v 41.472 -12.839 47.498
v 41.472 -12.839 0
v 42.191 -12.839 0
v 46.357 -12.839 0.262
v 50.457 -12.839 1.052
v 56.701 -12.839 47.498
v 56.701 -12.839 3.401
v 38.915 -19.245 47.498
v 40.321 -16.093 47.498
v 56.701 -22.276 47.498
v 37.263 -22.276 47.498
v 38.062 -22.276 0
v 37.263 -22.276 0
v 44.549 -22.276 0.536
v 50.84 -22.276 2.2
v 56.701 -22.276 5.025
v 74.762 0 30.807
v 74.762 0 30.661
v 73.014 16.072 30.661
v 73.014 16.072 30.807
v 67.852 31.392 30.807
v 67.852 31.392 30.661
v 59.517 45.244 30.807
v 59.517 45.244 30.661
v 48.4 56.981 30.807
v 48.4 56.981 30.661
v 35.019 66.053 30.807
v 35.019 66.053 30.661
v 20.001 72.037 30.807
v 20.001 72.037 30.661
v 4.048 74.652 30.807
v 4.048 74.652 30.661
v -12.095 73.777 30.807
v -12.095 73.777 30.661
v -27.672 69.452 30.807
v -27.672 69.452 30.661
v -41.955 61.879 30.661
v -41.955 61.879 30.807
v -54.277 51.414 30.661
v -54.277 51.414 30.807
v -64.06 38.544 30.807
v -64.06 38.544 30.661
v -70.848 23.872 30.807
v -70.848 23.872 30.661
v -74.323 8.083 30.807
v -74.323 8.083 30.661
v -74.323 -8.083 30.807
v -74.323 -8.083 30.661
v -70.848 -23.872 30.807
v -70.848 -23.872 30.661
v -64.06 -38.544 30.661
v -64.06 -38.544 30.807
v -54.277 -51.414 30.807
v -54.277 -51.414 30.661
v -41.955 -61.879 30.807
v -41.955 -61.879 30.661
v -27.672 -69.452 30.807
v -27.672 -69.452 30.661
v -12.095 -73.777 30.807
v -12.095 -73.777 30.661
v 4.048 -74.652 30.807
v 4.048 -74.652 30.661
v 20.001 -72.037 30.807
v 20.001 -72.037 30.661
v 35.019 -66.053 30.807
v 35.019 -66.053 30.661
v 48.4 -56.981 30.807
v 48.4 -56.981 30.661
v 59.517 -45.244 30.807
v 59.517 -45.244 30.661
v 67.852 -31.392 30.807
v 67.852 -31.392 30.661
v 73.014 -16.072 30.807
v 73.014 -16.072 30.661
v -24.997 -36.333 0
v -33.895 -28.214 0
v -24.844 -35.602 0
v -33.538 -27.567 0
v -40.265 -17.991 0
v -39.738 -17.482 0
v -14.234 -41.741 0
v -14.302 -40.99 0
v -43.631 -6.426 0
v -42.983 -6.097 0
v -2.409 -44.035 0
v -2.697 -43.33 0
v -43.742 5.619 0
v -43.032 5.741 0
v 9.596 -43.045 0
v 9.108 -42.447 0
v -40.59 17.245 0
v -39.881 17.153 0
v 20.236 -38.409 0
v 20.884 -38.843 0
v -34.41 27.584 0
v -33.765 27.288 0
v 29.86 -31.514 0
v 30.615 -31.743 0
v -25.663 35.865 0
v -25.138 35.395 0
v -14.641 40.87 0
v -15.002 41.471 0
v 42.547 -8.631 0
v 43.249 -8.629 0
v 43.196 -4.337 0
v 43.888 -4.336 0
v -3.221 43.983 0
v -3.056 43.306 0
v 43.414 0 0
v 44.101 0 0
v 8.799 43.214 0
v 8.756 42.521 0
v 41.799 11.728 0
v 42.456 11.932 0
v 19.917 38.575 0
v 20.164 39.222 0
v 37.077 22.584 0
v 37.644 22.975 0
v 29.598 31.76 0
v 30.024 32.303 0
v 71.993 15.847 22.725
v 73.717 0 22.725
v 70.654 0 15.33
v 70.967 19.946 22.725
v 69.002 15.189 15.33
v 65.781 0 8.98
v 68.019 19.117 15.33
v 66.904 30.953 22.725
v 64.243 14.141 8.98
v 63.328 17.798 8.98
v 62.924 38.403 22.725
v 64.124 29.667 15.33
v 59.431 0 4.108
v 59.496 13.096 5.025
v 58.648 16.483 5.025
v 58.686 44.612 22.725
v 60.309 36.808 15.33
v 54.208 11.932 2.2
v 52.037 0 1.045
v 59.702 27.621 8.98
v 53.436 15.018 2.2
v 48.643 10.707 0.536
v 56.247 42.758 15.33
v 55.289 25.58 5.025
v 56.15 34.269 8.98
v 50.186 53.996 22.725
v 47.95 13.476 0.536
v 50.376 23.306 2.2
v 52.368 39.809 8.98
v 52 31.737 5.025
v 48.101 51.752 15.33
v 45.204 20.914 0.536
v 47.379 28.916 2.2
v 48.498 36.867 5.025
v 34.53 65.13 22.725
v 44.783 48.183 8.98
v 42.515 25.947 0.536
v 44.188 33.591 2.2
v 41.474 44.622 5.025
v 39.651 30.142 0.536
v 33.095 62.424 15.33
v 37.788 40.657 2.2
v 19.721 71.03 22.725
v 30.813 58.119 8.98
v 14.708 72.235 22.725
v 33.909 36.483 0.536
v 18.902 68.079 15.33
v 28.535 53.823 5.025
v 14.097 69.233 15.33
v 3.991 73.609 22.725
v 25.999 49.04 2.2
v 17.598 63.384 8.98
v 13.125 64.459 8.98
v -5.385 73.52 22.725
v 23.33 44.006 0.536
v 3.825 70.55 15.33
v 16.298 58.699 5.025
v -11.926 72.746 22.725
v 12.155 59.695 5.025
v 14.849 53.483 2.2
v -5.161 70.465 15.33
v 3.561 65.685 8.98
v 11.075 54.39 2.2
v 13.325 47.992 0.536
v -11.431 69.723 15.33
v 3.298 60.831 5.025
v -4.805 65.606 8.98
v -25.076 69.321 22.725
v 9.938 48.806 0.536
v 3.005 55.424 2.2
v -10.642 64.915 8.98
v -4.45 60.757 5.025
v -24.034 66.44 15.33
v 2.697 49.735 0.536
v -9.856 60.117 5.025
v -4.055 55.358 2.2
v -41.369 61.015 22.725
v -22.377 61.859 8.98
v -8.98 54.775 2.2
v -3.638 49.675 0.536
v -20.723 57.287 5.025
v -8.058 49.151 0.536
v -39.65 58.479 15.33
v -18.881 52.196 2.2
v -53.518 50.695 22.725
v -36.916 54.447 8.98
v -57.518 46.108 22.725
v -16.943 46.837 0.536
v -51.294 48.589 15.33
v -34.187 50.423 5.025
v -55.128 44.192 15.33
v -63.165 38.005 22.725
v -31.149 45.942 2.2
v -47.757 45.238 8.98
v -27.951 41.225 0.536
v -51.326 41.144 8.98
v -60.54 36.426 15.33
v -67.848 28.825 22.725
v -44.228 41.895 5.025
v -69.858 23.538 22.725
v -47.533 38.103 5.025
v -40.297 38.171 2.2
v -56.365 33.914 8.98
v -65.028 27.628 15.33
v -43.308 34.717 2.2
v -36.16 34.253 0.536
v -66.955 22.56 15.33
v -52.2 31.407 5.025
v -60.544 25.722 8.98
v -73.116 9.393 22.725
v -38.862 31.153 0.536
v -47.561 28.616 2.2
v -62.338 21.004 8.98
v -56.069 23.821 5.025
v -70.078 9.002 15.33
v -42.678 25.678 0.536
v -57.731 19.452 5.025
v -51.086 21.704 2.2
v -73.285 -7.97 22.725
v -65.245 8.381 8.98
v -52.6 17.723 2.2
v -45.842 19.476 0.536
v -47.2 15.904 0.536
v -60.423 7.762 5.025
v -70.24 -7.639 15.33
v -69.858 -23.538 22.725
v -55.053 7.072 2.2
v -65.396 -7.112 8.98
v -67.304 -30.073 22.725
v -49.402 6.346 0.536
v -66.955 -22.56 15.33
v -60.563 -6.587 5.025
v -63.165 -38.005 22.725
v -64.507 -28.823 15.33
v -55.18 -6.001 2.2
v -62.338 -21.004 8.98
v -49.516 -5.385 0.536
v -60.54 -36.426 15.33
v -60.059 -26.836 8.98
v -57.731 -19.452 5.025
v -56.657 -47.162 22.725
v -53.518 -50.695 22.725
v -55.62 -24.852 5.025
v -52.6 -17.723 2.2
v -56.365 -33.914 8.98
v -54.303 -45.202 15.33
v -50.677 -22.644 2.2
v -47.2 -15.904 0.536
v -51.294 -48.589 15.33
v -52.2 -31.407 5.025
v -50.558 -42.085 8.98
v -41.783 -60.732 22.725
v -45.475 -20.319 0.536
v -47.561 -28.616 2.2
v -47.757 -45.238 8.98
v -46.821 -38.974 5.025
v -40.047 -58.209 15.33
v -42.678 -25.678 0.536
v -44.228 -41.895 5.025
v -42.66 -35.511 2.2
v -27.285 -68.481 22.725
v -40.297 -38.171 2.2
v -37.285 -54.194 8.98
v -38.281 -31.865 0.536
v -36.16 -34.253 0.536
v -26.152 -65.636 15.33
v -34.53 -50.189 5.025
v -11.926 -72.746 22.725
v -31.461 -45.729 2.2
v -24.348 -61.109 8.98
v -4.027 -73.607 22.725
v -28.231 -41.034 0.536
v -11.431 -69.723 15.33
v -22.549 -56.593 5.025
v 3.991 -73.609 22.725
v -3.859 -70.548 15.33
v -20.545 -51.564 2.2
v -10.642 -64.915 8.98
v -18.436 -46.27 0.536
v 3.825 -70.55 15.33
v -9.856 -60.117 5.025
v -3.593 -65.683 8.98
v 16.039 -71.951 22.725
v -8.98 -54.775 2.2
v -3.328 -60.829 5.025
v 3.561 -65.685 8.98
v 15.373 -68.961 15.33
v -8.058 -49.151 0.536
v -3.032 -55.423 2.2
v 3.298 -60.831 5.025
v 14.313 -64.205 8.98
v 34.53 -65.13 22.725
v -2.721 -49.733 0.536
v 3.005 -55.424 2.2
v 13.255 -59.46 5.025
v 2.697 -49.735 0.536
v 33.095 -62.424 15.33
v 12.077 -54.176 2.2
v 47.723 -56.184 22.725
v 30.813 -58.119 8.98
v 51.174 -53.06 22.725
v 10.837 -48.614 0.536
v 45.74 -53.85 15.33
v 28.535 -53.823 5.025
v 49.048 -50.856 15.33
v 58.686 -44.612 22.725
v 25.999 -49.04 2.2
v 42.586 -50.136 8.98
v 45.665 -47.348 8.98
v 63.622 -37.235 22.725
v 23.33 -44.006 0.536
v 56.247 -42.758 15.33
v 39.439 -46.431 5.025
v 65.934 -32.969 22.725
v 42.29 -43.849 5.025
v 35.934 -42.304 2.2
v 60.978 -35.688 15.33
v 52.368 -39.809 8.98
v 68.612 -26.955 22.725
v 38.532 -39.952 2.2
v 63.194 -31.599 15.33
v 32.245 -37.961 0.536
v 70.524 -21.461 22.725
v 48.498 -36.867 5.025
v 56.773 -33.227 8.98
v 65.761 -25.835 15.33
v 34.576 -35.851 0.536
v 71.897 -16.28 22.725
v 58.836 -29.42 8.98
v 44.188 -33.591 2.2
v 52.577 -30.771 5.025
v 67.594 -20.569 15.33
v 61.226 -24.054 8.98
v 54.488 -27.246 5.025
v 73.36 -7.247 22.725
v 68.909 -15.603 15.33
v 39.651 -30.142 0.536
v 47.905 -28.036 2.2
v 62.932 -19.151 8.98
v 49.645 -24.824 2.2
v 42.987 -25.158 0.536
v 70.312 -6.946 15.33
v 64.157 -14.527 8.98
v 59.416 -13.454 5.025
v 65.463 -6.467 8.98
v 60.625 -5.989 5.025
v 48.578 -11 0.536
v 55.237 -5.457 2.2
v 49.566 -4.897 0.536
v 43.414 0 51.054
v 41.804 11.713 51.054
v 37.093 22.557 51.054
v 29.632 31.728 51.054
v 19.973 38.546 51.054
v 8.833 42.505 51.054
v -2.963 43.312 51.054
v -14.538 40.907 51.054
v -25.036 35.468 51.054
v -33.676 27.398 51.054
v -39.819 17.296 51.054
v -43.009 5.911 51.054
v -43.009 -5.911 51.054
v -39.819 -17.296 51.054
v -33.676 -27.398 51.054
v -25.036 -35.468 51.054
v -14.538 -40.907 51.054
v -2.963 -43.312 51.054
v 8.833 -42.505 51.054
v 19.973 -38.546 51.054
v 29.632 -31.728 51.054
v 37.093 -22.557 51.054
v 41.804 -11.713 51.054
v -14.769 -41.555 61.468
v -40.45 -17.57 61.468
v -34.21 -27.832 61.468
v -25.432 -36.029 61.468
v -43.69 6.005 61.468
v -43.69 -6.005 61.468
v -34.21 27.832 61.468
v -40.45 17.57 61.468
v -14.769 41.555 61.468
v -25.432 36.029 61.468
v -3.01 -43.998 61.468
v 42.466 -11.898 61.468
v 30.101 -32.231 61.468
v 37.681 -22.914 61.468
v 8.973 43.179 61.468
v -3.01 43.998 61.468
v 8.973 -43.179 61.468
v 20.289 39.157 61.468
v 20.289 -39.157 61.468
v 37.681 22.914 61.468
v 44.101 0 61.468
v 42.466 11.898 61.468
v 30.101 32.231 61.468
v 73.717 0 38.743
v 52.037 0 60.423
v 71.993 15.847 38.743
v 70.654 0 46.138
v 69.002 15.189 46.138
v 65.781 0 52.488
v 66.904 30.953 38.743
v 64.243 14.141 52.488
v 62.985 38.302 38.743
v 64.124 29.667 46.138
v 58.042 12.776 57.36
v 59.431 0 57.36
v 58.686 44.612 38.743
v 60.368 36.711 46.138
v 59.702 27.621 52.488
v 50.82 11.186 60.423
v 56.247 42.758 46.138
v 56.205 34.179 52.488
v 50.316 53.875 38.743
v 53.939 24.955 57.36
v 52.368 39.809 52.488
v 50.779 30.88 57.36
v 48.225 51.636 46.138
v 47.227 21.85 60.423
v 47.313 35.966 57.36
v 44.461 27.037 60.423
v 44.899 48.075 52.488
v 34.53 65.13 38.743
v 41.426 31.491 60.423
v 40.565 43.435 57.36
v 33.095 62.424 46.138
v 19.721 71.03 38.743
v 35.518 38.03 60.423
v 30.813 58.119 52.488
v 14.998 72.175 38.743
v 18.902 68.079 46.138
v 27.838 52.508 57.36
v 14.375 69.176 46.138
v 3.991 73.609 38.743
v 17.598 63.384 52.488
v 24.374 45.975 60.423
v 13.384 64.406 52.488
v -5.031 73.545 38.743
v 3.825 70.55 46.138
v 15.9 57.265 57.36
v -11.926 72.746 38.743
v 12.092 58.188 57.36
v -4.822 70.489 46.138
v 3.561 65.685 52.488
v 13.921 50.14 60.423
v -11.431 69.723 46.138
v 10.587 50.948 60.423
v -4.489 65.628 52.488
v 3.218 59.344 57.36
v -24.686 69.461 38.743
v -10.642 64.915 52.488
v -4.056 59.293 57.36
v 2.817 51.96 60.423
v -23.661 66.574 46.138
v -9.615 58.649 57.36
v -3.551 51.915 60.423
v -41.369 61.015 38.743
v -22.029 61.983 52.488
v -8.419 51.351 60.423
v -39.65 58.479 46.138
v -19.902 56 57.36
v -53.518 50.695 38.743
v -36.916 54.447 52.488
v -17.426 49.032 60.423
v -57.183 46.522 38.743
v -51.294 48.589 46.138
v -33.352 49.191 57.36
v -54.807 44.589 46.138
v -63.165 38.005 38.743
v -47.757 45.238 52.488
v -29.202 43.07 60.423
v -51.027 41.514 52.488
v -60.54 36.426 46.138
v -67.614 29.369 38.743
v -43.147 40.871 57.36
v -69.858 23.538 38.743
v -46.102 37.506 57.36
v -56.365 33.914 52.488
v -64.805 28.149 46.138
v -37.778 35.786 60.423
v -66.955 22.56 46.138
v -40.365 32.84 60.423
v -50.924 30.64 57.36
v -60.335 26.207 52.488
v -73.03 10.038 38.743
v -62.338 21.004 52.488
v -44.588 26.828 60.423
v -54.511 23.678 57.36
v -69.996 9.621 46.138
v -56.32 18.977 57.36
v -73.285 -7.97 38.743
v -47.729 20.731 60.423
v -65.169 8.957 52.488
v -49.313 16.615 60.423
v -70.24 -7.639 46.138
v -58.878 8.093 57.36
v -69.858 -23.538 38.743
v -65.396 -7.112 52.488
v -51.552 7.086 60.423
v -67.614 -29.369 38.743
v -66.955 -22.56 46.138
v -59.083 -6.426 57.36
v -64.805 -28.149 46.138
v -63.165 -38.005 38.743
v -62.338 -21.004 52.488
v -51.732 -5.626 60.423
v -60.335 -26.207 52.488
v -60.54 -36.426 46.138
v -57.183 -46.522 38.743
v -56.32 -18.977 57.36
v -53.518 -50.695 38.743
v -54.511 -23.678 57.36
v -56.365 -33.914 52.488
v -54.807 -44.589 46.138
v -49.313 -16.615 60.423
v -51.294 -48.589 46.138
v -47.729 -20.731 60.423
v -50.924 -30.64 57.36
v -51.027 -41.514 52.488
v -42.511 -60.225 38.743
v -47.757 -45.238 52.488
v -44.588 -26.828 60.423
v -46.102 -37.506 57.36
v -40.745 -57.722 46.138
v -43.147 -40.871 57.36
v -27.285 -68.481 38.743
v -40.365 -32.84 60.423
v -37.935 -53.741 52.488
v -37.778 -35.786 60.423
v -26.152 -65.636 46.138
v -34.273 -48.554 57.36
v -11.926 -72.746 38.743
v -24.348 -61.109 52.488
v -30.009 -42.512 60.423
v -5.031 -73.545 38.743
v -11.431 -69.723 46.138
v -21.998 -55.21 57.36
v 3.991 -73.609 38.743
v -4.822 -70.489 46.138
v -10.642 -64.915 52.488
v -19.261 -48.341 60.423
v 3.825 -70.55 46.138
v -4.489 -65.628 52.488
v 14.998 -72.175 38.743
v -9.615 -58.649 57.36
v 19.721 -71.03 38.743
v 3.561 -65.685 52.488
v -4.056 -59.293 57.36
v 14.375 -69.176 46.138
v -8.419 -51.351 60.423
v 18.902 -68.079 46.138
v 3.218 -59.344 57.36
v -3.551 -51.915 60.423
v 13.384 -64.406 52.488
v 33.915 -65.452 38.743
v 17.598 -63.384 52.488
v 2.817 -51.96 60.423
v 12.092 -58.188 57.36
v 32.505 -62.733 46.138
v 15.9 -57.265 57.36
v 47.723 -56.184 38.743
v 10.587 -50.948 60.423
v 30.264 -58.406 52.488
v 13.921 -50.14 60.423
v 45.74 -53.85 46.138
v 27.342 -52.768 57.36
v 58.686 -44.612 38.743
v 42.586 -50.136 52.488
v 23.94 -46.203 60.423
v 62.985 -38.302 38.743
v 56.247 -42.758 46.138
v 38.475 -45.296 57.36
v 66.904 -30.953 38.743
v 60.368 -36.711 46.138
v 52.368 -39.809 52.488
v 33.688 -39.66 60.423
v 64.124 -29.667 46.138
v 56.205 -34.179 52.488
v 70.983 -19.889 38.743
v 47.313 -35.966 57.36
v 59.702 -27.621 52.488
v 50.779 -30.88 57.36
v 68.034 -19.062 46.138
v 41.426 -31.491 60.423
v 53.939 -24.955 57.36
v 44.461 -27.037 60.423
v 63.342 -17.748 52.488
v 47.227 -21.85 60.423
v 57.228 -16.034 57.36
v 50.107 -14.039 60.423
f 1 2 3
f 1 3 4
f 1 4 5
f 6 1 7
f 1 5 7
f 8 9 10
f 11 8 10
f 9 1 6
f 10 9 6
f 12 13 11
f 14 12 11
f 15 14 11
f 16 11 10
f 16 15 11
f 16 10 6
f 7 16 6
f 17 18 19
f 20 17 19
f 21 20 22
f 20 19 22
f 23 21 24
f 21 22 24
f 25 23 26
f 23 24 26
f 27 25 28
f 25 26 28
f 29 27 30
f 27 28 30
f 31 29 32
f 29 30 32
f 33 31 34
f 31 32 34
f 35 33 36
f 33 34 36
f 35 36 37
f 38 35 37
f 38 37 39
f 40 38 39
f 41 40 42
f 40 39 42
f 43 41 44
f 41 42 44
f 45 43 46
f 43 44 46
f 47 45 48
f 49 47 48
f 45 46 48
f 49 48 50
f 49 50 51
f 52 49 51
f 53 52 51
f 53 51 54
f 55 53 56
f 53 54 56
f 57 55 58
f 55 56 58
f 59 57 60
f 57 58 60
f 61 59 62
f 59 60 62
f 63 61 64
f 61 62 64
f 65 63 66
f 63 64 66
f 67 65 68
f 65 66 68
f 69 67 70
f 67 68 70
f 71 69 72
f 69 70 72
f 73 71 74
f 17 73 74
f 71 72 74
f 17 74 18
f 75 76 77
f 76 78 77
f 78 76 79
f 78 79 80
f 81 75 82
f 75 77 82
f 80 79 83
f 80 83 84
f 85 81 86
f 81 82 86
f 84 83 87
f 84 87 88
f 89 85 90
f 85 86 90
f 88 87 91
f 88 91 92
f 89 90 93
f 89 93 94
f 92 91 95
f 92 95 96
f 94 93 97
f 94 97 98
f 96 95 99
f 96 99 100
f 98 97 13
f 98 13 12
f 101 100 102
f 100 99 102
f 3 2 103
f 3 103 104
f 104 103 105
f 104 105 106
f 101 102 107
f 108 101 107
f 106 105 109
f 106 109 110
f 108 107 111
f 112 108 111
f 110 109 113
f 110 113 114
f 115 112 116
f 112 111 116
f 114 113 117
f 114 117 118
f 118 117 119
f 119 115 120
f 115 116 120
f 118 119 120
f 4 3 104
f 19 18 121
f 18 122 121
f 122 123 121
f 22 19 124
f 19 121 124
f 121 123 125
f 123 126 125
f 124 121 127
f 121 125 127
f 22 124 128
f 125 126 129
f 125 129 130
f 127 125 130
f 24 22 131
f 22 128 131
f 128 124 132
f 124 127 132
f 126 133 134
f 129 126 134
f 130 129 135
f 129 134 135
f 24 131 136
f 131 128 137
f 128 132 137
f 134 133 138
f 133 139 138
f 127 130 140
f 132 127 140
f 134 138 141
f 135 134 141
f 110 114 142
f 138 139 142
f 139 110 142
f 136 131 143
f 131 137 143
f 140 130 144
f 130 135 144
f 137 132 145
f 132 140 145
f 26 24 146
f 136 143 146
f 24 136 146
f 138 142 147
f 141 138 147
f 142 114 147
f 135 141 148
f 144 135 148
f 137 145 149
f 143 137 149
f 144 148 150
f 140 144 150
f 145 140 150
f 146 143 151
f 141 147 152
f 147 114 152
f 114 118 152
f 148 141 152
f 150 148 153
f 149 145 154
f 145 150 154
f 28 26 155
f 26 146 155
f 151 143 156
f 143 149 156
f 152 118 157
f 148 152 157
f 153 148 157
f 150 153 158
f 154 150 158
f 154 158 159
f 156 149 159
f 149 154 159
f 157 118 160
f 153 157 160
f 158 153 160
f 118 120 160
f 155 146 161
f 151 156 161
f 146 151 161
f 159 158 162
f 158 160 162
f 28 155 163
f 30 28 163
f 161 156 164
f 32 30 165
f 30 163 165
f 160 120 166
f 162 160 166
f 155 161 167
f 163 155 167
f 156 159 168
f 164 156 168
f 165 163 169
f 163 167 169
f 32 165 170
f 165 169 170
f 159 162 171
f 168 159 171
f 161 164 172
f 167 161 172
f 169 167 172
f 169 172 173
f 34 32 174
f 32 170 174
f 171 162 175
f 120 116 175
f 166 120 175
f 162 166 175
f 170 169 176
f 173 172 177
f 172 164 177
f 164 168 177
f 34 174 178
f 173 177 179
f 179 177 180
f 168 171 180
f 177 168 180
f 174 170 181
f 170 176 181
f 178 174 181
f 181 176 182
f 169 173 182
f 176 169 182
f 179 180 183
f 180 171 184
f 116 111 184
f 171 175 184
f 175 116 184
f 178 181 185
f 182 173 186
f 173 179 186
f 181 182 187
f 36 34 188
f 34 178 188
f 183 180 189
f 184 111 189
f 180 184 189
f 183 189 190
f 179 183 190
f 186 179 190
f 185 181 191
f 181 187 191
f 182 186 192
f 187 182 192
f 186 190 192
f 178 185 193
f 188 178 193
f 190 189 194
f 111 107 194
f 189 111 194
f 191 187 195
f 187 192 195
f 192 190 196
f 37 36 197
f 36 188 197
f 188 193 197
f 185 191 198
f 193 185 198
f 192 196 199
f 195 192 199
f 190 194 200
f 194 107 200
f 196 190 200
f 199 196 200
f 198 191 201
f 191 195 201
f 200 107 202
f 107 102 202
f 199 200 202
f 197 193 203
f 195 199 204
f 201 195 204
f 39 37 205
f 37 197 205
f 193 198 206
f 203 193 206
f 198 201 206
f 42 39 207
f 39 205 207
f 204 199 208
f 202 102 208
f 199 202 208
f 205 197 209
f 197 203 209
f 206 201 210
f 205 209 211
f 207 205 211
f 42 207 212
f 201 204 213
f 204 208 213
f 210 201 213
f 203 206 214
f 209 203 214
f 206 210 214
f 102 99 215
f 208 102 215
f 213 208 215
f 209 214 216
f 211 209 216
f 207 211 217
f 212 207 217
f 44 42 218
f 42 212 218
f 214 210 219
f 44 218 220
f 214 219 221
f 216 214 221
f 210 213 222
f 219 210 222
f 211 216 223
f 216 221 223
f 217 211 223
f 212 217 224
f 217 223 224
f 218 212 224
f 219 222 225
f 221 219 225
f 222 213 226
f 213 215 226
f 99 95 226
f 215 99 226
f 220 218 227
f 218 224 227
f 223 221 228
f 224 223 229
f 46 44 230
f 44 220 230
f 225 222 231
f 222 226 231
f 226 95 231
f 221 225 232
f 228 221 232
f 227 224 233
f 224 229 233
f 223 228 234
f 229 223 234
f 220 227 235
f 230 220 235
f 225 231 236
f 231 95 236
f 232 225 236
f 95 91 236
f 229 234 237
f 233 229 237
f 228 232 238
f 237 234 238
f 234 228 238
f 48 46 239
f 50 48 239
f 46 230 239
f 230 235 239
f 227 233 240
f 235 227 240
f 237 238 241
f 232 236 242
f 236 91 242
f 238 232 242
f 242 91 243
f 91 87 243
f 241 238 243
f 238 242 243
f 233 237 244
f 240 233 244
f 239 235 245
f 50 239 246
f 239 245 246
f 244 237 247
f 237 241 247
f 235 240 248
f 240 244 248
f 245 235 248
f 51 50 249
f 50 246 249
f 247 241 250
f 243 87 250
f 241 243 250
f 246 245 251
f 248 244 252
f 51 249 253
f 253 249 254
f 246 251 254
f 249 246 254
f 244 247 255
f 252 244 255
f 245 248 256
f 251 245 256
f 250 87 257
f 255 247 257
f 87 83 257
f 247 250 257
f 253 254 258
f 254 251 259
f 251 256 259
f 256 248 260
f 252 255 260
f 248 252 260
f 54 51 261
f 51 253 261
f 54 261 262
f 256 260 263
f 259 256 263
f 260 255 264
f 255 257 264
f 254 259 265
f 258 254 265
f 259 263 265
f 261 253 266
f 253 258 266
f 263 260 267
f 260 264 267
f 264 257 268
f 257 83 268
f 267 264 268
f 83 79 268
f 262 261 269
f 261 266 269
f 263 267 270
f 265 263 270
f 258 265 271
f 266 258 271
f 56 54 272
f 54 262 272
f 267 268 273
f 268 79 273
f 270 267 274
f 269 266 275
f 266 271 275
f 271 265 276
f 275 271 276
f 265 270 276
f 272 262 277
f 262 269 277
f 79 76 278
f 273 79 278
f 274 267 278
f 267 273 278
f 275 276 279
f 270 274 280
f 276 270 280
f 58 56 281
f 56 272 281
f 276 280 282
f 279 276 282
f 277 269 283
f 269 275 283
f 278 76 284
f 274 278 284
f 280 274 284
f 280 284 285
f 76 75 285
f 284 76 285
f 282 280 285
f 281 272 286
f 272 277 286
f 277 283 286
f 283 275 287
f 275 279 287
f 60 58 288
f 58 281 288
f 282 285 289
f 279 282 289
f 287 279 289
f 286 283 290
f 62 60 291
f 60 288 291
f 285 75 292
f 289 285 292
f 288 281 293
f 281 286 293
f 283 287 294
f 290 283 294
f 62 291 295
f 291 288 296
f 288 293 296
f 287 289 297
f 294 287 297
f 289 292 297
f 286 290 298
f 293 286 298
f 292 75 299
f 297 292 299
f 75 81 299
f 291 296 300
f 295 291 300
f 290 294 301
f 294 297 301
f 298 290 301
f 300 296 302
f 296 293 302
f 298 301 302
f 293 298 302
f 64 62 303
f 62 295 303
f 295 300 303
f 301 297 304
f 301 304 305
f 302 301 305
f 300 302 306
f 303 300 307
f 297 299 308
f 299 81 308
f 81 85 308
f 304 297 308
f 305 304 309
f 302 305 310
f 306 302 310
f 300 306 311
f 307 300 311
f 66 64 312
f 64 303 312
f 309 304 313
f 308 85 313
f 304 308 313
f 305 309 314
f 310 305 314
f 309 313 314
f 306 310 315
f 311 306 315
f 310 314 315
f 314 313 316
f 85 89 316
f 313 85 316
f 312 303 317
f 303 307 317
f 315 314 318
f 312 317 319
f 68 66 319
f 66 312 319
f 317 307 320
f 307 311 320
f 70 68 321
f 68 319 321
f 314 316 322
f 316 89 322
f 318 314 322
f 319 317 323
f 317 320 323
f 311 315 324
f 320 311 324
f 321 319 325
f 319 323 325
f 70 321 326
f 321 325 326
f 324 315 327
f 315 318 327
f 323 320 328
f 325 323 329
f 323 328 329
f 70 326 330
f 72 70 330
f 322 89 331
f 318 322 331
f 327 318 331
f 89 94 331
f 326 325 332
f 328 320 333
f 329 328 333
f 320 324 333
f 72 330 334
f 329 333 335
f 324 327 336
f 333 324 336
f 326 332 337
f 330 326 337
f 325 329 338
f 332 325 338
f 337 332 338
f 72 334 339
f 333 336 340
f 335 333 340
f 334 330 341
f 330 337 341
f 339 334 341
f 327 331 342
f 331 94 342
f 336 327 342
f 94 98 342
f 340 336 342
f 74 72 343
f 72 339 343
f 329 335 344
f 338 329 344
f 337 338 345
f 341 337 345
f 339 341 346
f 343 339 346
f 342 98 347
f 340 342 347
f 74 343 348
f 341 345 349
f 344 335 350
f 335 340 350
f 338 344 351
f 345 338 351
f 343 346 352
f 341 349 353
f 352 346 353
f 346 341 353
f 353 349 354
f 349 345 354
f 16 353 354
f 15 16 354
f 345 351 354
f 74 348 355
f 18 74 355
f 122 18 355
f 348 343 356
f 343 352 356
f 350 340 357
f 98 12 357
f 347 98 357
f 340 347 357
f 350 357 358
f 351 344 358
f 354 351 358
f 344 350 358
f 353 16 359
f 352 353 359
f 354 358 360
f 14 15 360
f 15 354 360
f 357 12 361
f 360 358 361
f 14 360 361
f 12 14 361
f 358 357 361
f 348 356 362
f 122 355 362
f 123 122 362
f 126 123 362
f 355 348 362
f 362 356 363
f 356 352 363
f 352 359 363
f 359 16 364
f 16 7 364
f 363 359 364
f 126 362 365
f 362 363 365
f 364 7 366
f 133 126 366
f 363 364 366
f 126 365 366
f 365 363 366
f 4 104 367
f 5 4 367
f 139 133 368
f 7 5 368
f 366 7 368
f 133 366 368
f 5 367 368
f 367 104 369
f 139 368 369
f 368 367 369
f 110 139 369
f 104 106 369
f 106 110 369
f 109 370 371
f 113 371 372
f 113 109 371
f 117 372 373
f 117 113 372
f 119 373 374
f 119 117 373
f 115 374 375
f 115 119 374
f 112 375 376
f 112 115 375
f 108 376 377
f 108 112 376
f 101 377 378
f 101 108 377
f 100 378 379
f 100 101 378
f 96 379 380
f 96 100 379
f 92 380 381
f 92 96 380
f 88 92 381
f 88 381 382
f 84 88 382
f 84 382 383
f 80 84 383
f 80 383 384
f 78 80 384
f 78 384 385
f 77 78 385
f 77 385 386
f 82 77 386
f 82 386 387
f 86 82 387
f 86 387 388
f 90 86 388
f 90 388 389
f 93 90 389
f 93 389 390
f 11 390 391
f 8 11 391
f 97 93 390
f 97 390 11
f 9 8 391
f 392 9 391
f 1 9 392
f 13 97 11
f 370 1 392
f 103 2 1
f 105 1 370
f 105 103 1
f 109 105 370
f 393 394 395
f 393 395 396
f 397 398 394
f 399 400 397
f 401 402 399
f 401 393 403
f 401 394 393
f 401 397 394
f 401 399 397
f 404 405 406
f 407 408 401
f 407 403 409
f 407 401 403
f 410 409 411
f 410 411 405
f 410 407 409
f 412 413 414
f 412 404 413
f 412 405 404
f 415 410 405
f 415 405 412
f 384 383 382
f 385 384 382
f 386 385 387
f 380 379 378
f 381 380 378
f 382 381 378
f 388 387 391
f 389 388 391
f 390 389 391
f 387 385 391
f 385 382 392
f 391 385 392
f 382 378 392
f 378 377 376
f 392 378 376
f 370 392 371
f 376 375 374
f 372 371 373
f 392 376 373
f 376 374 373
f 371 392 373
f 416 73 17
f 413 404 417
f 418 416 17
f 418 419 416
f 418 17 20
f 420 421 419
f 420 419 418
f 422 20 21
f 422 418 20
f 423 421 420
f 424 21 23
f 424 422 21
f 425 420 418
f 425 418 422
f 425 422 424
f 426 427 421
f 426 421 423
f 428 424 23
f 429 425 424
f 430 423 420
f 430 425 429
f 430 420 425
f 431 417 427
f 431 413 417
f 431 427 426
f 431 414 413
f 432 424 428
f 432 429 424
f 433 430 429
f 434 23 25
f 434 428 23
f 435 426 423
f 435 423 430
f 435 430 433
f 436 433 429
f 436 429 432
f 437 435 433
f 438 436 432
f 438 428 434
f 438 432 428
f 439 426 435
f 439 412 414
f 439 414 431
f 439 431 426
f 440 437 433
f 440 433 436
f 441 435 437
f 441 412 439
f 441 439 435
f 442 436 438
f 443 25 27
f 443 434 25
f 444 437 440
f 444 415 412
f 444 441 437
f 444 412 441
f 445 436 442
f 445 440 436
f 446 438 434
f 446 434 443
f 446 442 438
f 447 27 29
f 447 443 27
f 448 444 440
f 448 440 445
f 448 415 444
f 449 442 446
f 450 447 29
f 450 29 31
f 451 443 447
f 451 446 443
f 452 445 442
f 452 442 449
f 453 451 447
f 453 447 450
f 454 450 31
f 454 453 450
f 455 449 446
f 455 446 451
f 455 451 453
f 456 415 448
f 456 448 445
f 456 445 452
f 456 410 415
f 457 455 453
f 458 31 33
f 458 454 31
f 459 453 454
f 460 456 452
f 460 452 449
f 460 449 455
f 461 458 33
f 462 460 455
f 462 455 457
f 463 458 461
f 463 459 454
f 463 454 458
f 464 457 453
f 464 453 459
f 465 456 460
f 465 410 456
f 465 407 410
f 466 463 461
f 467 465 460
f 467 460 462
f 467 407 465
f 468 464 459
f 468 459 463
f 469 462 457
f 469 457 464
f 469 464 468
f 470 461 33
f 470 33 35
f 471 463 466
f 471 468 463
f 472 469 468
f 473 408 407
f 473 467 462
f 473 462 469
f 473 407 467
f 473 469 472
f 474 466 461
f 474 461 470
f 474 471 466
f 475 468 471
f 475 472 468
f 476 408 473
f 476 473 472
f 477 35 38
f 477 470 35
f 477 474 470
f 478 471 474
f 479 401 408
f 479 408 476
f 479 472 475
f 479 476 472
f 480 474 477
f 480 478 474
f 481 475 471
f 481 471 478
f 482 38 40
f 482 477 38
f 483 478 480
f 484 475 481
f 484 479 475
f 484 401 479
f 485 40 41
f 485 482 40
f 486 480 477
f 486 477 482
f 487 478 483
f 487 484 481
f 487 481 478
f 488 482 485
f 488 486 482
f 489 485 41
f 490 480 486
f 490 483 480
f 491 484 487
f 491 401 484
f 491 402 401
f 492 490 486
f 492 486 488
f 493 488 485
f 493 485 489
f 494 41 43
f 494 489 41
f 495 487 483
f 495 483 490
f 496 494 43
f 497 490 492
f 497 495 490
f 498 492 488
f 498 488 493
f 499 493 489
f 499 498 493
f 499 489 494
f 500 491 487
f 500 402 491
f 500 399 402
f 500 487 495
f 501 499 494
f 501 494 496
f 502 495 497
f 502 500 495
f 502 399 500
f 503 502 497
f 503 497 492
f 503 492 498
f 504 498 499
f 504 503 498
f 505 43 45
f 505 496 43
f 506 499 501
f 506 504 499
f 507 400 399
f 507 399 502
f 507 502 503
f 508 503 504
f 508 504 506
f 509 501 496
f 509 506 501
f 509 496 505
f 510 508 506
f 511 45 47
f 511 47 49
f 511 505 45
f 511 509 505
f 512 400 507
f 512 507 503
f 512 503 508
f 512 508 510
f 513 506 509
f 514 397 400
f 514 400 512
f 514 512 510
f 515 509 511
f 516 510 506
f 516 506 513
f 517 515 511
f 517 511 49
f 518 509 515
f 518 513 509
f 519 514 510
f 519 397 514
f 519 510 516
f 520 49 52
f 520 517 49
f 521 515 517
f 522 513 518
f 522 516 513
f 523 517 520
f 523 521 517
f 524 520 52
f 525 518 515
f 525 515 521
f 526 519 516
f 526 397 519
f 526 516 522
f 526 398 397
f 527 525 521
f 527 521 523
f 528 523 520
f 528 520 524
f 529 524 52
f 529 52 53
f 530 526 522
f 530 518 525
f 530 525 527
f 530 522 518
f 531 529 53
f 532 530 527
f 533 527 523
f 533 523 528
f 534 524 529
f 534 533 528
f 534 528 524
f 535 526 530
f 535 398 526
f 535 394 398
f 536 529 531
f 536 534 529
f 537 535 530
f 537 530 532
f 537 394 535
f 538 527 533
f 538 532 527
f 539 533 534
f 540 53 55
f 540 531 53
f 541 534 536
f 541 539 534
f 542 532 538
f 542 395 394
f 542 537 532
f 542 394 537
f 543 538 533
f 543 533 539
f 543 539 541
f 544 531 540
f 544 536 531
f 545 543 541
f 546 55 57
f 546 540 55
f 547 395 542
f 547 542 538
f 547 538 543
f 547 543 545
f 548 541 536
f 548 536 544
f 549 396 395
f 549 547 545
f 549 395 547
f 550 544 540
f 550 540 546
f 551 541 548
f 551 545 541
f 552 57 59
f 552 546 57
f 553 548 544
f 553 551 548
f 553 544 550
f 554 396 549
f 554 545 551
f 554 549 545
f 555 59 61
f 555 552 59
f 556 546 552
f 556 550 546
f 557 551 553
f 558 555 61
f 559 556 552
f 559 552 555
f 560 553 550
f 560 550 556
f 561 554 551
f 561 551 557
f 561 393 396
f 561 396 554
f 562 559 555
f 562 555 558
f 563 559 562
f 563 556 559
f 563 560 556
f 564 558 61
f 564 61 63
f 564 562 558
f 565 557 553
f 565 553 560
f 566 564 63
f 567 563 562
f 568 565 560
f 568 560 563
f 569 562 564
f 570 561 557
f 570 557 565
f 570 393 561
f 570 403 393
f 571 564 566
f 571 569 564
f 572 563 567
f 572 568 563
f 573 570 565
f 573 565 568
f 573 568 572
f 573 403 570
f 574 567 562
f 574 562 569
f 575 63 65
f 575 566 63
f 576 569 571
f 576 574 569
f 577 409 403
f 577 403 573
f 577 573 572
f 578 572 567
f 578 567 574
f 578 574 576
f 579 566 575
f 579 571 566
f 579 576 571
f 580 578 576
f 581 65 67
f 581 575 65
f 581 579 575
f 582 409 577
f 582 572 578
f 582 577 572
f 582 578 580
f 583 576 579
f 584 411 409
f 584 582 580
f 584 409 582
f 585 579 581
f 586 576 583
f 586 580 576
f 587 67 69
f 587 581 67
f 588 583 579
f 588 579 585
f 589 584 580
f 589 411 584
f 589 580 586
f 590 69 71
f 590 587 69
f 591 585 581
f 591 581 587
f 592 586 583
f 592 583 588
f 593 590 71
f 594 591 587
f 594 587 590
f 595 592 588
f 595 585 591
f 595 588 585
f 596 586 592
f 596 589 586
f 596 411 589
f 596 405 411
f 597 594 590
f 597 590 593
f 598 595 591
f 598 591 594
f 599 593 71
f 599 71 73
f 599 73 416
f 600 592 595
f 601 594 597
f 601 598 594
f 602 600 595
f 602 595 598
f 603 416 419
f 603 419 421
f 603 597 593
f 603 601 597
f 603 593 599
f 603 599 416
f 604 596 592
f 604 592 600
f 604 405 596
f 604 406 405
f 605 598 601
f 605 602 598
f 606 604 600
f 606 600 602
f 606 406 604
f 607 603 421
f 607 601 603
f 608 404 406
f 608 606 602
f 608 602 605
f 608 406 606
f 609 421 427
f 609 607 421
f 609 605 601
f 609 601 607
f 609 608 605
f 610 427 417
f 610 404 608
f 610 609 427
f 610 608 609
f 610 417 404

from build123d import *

# Parameters (mm, degrees)
F0_R     = 74.761682
F1_DEPTH = 61.468
F2_R     = 43.4135
F3_DEPTH = 51.054
F4_R     = 30.660512
F5_W     = 36.541538
F5_H     = 9.436814
F6_DEPTH = 47.498


with BuildPart() as f1:
    # F0 (on Top) → F1 (new body)
    with BuildSketch(Plane.XY):
        Circle(F0_R)
    extrude(amount=F1_DEPTH)

    # F2 (on Top) → F3 (cut)
    with BuildSketch(Plane.XY):
        Circle(F2_R)
    extrude(amount=F3_DEPTH, mode=Mode.SUBTRACT)

    # F4
    f4_edges = [f1.edges().sort_by_distance(p)[0] for p in [
        (-74.761682, 0, 0),
        (-74.761682, 0, 61.468),
    ]]
    fillet(f4_edges, radius=F4_R)

    # F5 (on Top) → F6 (cut)
    with BuildSketch(Plane.XY):
        with Locations((38.430351, -17.557447)):
            Rectangle(F5_W, F5_H)
    extrude(amount=F6_DEPTH, mode=Mode.SUBTRACT)


solid = f1.part
